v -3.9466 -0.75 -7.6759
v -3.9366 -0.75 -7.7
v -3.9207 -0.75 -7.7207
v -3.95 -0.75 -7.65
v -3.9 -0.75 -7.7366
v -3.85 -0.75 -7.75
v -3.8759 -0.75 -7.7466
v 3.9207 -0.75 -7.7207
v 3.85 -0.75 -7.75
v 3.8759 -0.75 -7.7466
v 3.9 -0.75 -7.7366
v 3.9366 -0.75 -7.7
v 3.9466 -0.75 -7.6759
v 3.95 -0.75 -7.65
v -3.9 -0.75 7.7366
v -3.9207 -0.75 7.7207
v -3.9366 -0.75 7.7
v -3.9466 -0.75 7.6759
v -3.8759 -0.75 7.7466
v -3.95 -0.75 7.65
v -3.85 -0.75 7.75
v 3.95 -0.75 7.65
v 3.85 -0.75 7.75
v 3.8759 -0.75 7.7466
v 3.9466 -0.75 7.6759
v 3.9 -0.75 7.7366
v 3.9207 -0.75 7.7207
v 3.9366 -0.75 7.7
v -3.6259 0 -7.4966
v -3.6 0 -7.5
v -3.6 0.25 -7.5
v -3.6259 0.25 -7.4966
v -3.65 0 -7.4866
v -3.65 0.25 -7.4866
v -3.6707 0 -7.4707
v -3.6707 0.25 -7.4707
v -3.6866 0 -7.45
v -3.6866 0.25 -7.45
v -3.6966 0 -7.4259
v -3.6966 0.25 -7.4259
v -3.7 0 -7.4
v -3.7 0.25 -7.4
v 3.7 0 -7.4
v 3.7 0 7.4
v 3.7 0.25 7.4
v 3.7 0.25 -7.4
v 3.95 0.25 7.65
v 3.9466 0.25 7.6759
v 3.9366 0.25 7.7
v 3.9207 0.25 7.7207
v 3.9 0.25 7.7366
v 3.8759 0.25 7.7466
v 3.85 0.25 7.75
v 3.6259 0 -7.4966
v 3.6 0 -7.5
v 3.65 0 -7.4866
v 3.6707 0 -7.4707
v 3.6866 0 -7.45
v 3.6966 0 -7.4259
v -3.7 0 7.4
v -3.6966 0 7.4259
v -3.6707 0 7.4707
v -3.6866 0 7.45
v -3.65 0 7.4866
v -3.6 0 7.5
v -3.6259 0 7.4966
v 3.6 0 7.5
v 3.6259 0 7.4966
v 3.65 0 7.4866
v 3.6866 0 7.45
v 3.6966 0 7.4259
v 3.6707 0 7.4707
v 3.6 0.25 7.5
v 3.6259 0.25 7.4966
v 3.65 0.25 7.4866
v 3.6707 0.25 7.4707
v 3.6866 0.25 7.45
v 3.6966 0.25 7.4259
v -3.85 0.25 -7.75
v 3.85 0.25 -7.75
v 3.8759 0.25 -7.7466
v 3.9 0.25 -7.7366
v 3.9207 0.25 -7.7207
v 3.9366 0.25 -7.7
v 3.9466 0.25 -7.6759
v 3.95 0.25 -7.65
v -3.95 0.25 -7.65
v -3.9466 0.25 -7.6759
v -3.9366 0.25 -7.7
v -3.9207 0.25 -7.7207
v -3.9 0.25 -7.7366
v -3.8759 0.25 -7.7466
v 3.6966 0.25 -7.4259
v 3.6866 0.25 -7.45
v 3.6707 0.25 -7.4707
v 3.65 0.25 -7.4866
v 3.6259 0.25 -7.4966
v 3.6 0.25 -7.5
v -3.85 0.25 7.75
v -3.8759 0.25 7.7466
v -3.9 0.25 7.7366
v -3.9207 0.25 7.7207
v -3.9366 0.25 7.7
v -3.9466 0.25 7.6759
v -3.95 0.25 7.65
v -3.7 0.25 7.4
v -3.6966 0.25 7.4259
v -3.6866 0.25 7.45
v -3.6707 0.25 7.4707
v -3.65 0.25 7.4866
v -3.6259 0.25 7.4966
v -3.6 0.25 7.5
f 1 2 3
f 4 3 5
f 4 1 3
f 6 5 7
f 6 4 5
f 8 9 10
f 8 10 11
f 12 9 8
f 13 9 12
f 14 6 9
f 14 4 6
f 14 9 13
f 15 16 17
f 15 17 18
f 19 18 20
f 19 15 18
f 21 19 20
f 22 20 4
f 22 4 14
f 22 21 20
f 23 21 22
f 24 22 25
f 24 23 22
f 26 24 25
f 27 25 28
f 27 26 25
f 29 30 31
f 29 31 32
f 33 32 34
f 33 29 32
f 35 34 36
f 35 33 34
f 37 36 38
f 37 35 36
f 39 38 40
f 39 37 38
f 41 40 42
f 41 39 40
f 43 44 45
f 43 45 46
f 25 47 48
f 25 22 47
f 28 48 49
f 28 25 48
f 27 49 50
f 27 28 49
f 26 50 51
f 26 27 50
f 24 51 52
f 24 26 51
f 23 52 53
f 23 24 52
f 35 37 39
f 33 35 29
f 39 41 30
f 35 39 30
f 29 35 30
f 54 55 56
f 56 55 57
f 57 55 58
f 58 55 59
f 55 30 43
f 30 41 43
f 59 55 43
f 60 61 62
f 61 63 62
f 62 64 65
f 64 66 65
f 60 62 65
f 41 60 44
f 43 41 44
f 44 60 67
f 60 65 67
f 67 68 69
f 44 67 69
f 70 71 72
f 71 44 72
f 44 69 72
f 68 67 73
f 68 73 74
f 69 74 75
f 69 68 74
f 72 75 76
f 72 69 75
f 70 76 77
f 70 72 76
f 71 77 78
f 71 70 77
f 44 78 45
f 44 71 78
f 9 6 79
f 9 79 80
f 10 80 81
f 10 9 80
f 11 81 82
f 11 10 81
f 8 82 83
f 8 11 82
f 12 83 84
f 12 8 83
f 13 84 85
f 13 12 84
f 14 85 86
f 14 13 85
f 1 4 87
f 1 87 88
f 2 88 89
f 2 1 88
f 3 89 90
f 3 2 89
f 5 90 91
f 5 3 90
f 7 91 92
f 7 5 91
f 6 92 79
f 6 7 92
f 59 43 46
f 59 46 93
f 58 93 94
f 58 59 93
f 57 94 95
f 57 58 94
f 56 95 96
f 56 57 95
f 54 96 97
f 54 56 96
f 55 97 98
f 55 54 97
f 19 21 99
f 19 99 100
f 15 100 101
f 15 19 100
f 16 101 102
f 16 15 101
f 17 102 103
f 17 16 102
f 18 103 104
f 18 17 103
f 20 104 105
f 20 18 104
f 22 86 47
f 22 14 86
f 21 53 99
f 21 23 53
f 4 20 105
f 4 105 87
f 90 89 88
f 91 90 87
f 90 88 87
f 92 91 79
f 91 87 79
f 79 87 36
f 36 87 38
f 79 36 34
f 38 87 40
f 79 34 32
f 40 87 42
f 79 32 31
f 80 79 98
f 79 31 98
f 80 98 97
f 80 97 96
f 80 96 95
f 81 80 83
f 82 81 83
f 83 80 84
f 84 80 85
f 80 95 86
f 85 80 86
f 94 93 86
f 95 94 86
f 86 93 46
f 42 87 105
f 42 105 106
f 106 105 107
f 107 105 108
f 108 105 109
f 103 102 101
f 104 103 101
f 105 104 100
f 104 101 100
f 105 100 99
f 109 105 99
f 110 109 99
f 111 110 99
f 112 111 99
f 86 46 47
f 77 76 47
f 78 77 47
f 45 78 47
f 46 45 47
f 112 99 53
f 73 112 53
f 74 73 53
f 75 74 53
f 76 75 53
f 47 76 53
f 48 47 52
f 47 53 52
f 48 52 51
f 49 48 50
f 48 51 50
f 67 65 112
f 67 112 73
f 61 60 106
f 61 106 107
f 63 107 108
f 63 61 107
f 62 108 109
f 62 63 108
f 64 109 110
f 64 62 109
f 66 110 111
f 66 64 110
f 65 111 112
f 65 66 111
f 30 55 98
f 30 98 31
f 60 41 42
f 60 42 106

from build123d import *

# Parameters (mm, degrees)
F1_DEPTH = 0.75
F2_DEPTH = 0.75
F3_DEPTH = 0.25


with BuildPart() as f1:
    # F0 (on Front) → F1 (new body)
    with BuildSketch(Plane.XZ):
        with BuildLine():
            Line((3.85, 7.75), (-3.85, 7.75))
            ThreePointArc((-3.85, 7.75), (-3.9207106781, 7.7207106781), (-3.95, 7.65))
            Line((-3.95, 7.65), (-3.95, -7.65))
            ThreePointArc((-3.95, -7.65), (-3.9207106781, -7.7207106781), (-3.85, -7.75))
            Line((-3.85, -7.75), (3.85, -7.75))
            ThreePointArc((3.85, -7.75), (3.9207106781, -7.7207106781), (3.95, -7.65))
            Line((3.95, -7.65), (3.95, 7.65))
            ThreePointArc((3.95, 7.65), (3.9207106781, 7.7207106781), (3.85, 7.75))
        make_face()
        with BuildLine():
            ThreePointArc((-3.7, 7.4), (-3.6707106781, 7.4707106781), (-3.6, 7.5))
            Line((-3.6, 7.5), (3.6, 7.5))
            ThreePointArc((3.6, 7.5), (3.6707106781, 7.4707106781), (3.7, 7.4))
            Line((3.7, 7.4), (3.7, -7.4))
            ThreePointArc((3.7, -7.4), (3.6707106781, -7.4707106781), (3.6, -7.5))
            Line((3.6, -7.5), (-3.6, -7.5))
            ThreePointArc((-3.6, -7.5), (-3.6707106781, -7.4707106781), (-3.7, -7.4))
            Line((-3.7, -7.4), (-3.7, 7.4))
        make_face(mode=Mode.SUBTRACT)
        with BuildLine():
            Line((3.6, 7.5), (-3.6, 7.5))
            ThreePointArc((-3.6, 7.5), (-3.6707106781, 7.4707106781), (-3.7, 7.4))
            Line((-3.7, 7.4), (-3.7, -7.4))
            ThreePointArc((-3.7, -7.4), (-3.6707106781, -7.4707106781), (-3.6, -7.5))
            Line((-3.6, -7.5), (3.6, -7.5))
            ThreePointArc((3.6, -7.5), (3.6707106781, -7.4707106781), (3.7, -7.4))
            Line((3.7, -7.4), (3.7, 7.4))
            ThreePointArc((3.7, 7.4), (3.6707106781, 7.4707106781), (3.6, 7.5))
        make_face()
    extrude(amount=F1_DEPTH)

    # F0 (on Front) → F2 (join)
    with BuildSketch(Plane.XZ):
        with BuildLine():
            Line((3.85, 7.75), (-3.85, 7.75))
            ThreePointArc((-3.85, 7.75), (-3.9207106781, 7.7207106781), (-3.95, 7.65))
            Line((-3.95, 7.65), (-3.95, -7.65))
            ThreePointArc((-3.95, -7.65), (-3.9207106781, -7.7207106781), (-3.85, -7.75))
            Line((-3.85, -7.75), (3.85, -7.75))
            ThreePointArc((3.85, -7.75), (3.9207106781, -7.7207106781), (3.95, -7.65))
            Line((3.95, -7.65), (3.95, 7.65))
            ThreePointArc((3.95, 7.65), (3.9207106781, 7.7207106781), (3.85, 7.75))
        make_face()
        with BuildLine():
            ThreePointArc((-3.7, 7.4), (-3.6707106781, 7.4707106781), (-3.6, 7.5))
            Line((-3.6, 7.5), (3.6, 7.5))
            ThreePointArc((3.6, 7.5), (3.6707106781, 7.4707106781), (3.7, 7.4))
            Line((3.7, 7.4), (3.7, -7.4))
            ThreePointArc((3.7, -7.4), (3.6707106781, -7.4707106781), (3.6, -7.5))
            Line((3.6, -7.5), (-3.6, -7.5))
            ThreePointArc((-3.6, -7.5), (-3.6707106781, -7.4707106781), (-3.7, -7.4))
            Line((-3.7, -7.4), (-3.7, 7.4))
        make_face(mode=Mode.SUBTRACT)
    extrude(amount=F2_DEPTH)

    # F0 (on Front) → F3 (join)
    with BuildSketch(Plane.XZ):
        with BuildLine():
            Line((3.85, 7.75), (-3.85, 7.75))
            ThreePointArc((-3.85, 7.75), (-3.9207106781, 7.7207106781), (-3.95, 7.65))
            Line((-3.95, 7.65), (-3.95, -7.65))
            ThreePointArc((-3.95, -7.65), (-3.9207106781, -7.7207106781), (-3.85, -7.75))
            Line((-3.85, -7.75), (3.85, -7.75))
            ThreePointArc((3.85, -7.75), (3.9207106781, -7.7207106781), (3.95, -7.65))
            Line((3.95, -7.65), (3.95, 7.65))
            ThreePointArc((3.95, 7.65), (3.9207106781, 7.7207106781), (3.85, 7.75))
        make_face()
        with BuildLine():
            ThreePointArc((-3.7, 7.4), (-3.6707106781, 7.4707106781), (-3.6, 7.5))
            Line((-3.6, 7.5), (3.6, 7.5))
            ThreePointArc((3.6, 7.5), (3.6707106781, 7.4707106781), (3.7, 7.4))
            Line((3.7, 7.4), (3.7, -7.4))
            ThreePointArc((3.7, -7.4), (3.6707106781, -7.4707106781), (3.6, -7.5))
            Line((3.6, -7.5), (-3.6, -7.5))
            ThreePointArc((-3.6, -7.5), (-3.6707106781, -7.4707106781), (-3.7, -7.4))
            Line((-3.7, -7.4), (-3.7, 7.4))
        make_face(mode=Mode.SUBTRACT)
    extrude(amount=-F3_DEPTH)


solid = f1.part
